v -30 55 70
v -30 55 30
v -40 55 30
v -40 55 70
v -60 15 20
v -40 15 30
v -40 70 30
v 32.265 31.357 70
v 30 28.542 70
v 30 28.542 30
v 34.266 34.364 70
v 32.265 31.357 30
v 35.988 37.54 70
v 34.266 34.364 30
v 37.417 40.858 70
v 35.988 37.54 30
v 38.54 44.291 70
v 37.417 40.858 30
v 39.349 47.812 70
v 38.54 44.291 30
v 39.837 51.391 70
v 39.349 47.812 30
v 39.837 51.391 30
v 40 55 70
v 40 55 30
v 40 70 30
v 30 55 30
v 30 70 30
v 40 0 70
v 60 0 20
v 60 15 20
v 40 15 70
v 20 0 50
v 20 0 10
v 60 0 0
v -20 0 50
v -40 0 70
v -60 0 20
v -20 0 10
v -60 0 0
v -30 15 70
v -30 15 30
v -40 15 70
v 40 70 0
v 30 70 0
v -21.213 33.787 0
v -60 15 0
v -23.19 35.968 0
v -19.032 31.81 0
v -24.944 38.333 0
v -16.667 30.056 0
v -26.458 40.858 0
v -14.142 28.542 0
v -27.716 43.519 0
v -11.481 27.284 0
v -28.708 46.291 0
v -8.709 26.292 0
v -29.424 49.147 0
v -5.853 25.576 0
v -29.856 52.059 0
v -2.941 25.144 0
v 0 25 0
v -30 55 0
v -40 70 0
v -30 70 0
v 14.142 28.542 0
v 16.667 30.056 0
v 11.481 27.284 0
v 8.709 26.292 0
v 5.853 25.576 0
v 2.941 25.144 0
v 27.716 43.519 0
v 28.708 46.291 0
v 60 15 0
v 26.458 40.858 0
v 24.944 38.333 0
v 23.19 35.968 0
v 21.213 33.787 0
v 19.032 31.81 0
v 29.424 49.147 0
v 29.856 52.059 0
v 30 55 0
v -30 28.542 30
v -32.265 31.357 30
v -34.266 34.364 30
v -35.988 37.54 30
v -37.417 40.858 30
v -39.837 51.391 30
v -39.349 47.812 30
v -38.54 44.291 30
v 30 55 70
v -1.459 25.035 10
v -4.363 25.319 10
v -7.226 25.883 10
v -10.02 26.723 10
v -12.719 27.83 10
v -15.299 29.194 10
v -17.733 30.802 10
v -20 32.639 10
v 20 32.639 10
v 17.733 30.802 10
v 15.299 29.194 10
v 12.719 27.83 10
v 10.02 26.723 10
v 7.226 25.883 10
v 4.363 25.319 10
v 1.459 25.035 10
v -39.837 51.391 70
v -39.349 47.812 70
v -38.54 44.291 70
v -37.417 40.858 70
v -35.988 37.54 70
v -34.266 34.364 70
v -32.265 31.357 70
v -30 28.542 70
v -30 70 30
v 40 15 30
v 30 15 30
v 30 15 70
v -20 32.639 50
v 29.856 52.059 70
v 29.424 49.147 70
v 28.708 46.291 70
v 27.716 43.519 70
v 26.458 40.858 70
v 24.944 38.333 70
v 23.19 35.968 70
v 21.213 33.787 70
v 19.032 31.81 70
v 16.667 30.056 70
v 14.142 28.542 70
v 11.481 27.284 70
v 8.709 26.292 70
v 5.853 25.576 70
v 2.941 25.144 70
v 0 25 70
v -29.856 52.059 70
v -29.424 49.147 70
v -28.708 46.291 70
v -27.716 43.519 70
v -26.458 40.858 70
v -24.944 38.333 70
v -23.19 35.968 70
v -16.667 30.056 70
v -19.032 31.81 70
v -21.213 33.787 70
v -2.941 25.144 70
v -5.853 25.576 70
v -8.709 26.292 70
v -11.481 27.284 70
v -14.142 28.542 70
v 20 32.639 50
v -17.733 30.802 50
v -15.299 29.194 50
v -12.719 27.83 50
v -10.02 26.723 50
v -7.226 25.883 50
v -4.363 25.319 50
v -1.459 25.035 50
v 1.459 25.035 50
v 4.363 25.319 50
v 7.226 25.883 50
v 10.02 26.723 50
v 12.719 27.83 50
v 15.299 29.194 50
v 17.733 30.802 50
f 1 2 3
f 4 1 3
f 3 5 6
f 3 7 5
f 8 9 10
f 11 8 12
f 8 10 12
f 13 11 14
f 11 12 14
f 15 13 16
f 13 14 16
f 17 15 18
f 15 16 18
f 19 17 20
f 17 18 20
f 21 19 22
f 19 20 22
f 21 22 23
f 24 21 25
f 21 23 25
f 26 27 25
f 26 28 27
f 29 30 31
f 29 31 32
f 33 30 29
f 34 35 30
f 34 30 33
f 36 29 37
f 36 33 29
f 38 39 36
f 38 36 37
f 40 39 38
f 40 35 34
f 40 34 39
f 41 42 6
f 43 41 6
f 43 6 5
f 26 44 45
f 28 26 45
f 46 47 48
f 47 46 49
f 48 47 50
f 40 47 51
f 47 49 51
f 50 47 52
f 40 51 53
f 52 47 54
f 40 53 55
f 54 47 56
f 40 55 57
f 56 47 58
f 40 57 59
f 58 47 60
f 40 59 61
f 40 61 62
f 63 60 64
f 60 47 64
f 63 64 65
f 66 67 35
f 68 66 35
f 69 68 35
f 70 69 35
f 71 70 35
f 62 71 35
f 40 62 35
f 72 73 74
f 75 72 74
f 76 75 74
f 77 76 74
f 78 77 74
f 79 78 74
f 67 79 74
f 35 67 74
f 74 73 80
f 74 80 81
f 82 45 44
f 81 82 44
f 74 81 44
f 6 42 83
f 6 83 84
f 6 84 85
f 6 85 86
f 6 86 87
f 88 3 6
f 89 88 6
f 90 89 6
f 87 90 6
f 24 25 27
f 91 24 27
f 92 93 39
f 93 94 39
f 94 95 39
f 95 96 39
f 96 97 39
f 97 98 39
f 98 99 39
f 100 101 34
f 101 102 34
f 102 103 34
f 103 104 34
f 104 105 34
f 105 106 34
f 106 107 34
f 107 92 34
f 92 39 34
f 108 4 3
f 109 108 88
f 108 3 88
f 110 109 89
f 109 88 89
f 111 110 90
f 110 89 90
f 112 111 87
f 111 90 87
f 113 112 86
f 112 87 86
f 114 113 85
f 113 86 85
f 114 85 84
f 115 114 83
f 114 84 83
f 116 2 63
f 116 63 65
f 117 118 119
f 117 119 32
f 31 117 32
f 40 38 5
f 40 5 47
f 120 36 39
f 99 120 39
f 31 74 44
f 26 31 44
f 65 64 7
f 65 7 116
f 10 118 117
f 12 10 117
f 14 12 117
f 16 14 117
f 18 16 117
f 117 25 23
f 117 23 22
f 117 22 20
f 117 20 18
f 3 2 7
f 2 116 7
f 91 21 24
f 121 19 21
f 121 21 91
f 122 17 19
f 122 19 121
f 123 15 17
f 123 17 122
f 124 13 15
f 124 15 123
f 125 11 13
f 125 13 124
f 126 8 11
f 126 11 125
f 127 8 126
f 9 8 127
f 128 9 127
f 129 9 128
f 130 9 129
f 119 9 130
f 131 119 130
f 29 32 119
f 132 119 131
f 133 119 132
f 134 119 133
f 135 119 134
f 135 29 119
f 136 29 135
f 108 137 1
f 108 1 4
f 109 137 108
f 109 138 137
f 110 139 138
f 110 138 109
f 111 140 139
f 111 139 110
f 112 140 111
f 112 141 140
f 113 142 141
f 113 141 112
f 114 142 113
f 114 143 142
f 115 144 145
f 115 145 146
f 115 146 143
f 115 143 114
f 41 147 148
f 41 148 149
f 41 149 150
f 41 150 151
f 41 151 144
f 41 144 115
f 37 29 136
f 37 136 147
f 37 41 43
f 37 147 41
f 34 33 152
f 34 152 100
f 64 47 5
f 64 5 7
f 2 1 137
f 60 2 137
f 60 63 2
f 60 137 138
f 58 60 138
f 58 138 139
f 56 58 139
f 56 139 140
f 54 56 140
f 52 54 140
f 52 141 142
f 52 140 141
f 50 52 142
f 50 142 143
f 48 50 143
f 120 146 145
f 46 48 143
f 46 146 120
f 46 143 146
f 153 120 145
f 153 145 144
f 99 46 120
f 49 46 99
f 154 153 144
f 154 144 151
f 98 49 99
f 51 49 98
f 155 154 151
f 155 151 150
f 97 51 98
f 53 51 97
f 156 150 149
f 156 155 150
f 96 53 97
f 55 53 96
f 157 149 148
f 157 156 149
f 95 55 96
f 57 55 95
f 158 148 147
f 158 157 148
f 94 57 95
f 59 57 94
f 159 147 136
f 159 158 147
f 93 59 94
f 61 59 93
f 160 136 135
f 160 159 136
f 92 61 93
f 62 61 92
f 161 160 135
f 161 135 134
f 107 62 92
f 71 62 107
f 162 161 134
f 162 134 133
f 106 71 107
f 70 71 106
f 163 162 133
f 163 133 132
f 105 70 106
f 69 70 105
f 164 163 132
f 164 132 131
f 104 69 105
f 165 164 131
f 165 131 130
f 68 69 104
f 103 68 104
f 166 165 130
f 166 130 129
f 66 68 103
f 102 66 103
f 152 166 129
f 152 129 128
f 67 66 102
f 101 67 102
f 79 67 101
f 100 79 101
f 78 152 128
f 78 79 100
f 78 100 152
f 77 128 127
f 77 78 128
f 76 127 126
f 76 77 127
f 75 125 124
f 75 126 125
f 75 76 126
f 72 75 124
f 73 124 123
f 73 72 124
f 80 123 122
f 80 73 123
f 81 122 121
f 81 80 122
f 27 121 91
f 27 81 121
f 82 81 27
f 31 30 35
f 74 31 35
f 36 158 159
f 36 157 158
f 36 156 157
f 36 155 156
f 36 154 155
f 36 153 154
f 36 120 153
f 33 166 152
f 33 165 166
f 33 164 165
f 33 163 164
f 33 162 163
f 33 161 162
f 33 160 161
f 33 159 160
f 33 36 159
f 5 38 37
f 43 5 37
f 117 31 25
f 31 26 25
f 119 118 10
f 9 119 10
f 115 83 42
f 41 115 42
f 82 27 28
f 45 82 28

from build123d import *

# Parameters (mm, degrees)
SKETCH1_W               = 80
SKETCH1_H               = 70
BOSS_EXTRUDE1_DEPTH     = 15
BOSS_EXTRUDE2_DEPTH     = 70
SKETCH3_W               = 20
SKETCH3_H               = 70
BOSS_EXTRUDE3_DEPTH     = 15
SKETCH4_W               = 10
SKETCH4_H               = 15
BOSS_EXTRUDE4_DEPTH     = 30
BOSS_EXTRUDE5_DEPTH     = 30
CUT_EXTRUDE1_DEPTH      = 15
CUT_EXTRUDE2_START      = 15
CUT_EXTRUDE2_DEPTH      = 60
CUT_EXTRUDE3_DEPTH      = 116.758369028
CUT_EXTRUDE3_DEPTH_BACK = 116.758369028
CUT_EXTRUDE4_DEPTH      = 116.758369028
CUT_EXTRUDE4_DEPTH_BACK = 116.758369028
SKETCH9_W               = 40
SKETCH9_H               = 40


with BuildPart() as part:
    # Sketch1 → Boss-Extrude1 (new body)
    with BuildSketch(Plane(origin=(0, 0, 0), x_dir=(1, 0, 0), z_dir=(0, 1, 0))):
        with Locations((0, -35)):
            Rectangle(SKETCH1_W, SKETCH1_H)
    extrude(amount=BOSS_EXTRUDE1_DEPTH)

    # Sketch2 → Boss-Extrude2 (add)
    with BuildSketch(Plane.XY):
        with BuildLine():
            Line((-30, 15), (30, 15))
            Line((30, 15), (30, 28.542486889))
            ThreePointArc((30, 28.542486889), (37.416573868, 40.857864376), (40, 55))
            Line((40, 55), (-40, 55))
            ThreePointArc((-40, 55), (-37.416573868, 40.857864376), (-30, 28.542486889))
            Line((-30, 28.542486889), (-30, 15))
        make_face()
    extrude(amount=BOSS_EXTRUDE2_DEPTH)

    # Sketch3 → Boss-Extrude3 (add)
    with BuildSketch(Plane(origin=(0, 0, 0), x_dir=(1, 0, 0), z_dir=(0, 1, 0))):
        with Locations((-50, -35)):
            Rectangle(SKETCH3_W, SKETCH3_H)
    boss_extrude3 = extrude(amount=BOSS_EXTRUDE3_DEPTH)

    # Sketch4 → Boss-Extrude4 (add)
    with BuildSketch(Plane.XY):
        with Locations((-35, 62.5)):
            Rectangle(SKETCH4_W, SKETCH4_H)
    boss_extrude4 = extrude(amount=BOSS_EXTRUDE4_DEPTH)

    # Sketch5 → Boss-Extrude5 (add)
    with BuildSketch(Plane.XY):
        Polygon((-60, 15), (-40, 70), (-40, 55), (-30, 55), (-30, 15), align=None)
    boss_extrude5 = extrude(amount=BOSS_EXTRUDE5_DEPTH)

    # Sketch6 → Cut-Extrude1 (cut)
    with BuildSketch(Plane(origin=(0, 0, 0), x_dir=(1, 0, 0), z_dir=(0, 1, 0))):
        Polygon((-60, -20), (-40, -70), (-60, -70), align=None)
    cut_extrude1 = extrude(amount=CUT_EXTRUDE1_DEPTH, mode=Mode.SUBTRACT)

    # Sketch7 → Cut-Extrude2 (cut)
    with BuildSketch(Plane(origin=(0, 0, 0), x_dir=(1, 0, 0), z_dir=(0, 1, 0)).offset(CUT_EXTRUDE2_START)):
        Polygon((-60, -20), (-40, -30), (-60, -30), align=None)
    cut_extrude2 = extrude(amount=CUT_EXTRUDE2_DEPTH, mode=Mode.SUBTRACT)

    # Mirror1: Boss-Extrude3, Boss-Extrude4, Boss-Extrude5, Cut-Extrude1, Cut-Extrude2 across plane
    add(boss_extrude3.mirror(Plane(origin=(0, 0, 0), x_dir=(0, 0, 1), z_dir=(1, 0, 0))))
    add(boss_extrude4.mirror(Plane(origin=(0, 0, 0), x_dir=(0, 0, 1), z_dir=(1, 0, 0))))
    add(boss_extrude5.mirror(Plane(origin=(0, 0, 0), x_dir=(0, 0, 1), z_dir=(1, 0, 0))))
    add(cut_extrude1.mirror(Plane(origin=(0, 0, 0), x_dir=(0, 0, 1), z_dir=(1, 0, 0))), mode=Mode.SUBTRACT)
    add(cut_extrude2.mirror(Plane(origin=(0, 0, 0), x_dir=(0, 0, 1), z_dir=(1, 0, 0))), mode=Mode.SUBTRACT)

    # Sketch8 → Cut-Extrude3 (cut, two sides: drawn at the far end of the back side and taken through both)
    with BuildSketch(Plane.XY.offset(-CUT_EXTRUDE3_DEPTH_BACK)):
        with BuildLine():
            Line((-30, 72), (-30, 55))
            ThreePointArc((-30, 55), (0, 25), (30, 55))
            Line((30, 55), (30, 72))
            Line((30, 72), (-30, 72))
        make_face()
    extrude(amount=CUT_EXTRUDE3_DEPTH + CUT_EXTRUDE3_DEPTH_BACK, mode=Mode.SUBTRACT)

    # Sketch9 → Cut-Extrude4 (cut, two sides: drawn at the far end of the back side and taken through both)
    with BuildSketch(Plane(origin=(0, 0, 0), x_dir=(1, 0, 0), z_dir=(0, 1, 0)).offset(-CUT_EXTRUDE4_DEPTH_BACK)):
        with Locations((0, -30)):
            Rectangle(SKETCH9_W, SKETCH9_H)
    extrude(amount=CUT_EXTRUDE4_DEPTH + CUT_EXTRUDE4_DEPTH_BACK, mode=Mode.SUBTRACT)


solid = part.part
